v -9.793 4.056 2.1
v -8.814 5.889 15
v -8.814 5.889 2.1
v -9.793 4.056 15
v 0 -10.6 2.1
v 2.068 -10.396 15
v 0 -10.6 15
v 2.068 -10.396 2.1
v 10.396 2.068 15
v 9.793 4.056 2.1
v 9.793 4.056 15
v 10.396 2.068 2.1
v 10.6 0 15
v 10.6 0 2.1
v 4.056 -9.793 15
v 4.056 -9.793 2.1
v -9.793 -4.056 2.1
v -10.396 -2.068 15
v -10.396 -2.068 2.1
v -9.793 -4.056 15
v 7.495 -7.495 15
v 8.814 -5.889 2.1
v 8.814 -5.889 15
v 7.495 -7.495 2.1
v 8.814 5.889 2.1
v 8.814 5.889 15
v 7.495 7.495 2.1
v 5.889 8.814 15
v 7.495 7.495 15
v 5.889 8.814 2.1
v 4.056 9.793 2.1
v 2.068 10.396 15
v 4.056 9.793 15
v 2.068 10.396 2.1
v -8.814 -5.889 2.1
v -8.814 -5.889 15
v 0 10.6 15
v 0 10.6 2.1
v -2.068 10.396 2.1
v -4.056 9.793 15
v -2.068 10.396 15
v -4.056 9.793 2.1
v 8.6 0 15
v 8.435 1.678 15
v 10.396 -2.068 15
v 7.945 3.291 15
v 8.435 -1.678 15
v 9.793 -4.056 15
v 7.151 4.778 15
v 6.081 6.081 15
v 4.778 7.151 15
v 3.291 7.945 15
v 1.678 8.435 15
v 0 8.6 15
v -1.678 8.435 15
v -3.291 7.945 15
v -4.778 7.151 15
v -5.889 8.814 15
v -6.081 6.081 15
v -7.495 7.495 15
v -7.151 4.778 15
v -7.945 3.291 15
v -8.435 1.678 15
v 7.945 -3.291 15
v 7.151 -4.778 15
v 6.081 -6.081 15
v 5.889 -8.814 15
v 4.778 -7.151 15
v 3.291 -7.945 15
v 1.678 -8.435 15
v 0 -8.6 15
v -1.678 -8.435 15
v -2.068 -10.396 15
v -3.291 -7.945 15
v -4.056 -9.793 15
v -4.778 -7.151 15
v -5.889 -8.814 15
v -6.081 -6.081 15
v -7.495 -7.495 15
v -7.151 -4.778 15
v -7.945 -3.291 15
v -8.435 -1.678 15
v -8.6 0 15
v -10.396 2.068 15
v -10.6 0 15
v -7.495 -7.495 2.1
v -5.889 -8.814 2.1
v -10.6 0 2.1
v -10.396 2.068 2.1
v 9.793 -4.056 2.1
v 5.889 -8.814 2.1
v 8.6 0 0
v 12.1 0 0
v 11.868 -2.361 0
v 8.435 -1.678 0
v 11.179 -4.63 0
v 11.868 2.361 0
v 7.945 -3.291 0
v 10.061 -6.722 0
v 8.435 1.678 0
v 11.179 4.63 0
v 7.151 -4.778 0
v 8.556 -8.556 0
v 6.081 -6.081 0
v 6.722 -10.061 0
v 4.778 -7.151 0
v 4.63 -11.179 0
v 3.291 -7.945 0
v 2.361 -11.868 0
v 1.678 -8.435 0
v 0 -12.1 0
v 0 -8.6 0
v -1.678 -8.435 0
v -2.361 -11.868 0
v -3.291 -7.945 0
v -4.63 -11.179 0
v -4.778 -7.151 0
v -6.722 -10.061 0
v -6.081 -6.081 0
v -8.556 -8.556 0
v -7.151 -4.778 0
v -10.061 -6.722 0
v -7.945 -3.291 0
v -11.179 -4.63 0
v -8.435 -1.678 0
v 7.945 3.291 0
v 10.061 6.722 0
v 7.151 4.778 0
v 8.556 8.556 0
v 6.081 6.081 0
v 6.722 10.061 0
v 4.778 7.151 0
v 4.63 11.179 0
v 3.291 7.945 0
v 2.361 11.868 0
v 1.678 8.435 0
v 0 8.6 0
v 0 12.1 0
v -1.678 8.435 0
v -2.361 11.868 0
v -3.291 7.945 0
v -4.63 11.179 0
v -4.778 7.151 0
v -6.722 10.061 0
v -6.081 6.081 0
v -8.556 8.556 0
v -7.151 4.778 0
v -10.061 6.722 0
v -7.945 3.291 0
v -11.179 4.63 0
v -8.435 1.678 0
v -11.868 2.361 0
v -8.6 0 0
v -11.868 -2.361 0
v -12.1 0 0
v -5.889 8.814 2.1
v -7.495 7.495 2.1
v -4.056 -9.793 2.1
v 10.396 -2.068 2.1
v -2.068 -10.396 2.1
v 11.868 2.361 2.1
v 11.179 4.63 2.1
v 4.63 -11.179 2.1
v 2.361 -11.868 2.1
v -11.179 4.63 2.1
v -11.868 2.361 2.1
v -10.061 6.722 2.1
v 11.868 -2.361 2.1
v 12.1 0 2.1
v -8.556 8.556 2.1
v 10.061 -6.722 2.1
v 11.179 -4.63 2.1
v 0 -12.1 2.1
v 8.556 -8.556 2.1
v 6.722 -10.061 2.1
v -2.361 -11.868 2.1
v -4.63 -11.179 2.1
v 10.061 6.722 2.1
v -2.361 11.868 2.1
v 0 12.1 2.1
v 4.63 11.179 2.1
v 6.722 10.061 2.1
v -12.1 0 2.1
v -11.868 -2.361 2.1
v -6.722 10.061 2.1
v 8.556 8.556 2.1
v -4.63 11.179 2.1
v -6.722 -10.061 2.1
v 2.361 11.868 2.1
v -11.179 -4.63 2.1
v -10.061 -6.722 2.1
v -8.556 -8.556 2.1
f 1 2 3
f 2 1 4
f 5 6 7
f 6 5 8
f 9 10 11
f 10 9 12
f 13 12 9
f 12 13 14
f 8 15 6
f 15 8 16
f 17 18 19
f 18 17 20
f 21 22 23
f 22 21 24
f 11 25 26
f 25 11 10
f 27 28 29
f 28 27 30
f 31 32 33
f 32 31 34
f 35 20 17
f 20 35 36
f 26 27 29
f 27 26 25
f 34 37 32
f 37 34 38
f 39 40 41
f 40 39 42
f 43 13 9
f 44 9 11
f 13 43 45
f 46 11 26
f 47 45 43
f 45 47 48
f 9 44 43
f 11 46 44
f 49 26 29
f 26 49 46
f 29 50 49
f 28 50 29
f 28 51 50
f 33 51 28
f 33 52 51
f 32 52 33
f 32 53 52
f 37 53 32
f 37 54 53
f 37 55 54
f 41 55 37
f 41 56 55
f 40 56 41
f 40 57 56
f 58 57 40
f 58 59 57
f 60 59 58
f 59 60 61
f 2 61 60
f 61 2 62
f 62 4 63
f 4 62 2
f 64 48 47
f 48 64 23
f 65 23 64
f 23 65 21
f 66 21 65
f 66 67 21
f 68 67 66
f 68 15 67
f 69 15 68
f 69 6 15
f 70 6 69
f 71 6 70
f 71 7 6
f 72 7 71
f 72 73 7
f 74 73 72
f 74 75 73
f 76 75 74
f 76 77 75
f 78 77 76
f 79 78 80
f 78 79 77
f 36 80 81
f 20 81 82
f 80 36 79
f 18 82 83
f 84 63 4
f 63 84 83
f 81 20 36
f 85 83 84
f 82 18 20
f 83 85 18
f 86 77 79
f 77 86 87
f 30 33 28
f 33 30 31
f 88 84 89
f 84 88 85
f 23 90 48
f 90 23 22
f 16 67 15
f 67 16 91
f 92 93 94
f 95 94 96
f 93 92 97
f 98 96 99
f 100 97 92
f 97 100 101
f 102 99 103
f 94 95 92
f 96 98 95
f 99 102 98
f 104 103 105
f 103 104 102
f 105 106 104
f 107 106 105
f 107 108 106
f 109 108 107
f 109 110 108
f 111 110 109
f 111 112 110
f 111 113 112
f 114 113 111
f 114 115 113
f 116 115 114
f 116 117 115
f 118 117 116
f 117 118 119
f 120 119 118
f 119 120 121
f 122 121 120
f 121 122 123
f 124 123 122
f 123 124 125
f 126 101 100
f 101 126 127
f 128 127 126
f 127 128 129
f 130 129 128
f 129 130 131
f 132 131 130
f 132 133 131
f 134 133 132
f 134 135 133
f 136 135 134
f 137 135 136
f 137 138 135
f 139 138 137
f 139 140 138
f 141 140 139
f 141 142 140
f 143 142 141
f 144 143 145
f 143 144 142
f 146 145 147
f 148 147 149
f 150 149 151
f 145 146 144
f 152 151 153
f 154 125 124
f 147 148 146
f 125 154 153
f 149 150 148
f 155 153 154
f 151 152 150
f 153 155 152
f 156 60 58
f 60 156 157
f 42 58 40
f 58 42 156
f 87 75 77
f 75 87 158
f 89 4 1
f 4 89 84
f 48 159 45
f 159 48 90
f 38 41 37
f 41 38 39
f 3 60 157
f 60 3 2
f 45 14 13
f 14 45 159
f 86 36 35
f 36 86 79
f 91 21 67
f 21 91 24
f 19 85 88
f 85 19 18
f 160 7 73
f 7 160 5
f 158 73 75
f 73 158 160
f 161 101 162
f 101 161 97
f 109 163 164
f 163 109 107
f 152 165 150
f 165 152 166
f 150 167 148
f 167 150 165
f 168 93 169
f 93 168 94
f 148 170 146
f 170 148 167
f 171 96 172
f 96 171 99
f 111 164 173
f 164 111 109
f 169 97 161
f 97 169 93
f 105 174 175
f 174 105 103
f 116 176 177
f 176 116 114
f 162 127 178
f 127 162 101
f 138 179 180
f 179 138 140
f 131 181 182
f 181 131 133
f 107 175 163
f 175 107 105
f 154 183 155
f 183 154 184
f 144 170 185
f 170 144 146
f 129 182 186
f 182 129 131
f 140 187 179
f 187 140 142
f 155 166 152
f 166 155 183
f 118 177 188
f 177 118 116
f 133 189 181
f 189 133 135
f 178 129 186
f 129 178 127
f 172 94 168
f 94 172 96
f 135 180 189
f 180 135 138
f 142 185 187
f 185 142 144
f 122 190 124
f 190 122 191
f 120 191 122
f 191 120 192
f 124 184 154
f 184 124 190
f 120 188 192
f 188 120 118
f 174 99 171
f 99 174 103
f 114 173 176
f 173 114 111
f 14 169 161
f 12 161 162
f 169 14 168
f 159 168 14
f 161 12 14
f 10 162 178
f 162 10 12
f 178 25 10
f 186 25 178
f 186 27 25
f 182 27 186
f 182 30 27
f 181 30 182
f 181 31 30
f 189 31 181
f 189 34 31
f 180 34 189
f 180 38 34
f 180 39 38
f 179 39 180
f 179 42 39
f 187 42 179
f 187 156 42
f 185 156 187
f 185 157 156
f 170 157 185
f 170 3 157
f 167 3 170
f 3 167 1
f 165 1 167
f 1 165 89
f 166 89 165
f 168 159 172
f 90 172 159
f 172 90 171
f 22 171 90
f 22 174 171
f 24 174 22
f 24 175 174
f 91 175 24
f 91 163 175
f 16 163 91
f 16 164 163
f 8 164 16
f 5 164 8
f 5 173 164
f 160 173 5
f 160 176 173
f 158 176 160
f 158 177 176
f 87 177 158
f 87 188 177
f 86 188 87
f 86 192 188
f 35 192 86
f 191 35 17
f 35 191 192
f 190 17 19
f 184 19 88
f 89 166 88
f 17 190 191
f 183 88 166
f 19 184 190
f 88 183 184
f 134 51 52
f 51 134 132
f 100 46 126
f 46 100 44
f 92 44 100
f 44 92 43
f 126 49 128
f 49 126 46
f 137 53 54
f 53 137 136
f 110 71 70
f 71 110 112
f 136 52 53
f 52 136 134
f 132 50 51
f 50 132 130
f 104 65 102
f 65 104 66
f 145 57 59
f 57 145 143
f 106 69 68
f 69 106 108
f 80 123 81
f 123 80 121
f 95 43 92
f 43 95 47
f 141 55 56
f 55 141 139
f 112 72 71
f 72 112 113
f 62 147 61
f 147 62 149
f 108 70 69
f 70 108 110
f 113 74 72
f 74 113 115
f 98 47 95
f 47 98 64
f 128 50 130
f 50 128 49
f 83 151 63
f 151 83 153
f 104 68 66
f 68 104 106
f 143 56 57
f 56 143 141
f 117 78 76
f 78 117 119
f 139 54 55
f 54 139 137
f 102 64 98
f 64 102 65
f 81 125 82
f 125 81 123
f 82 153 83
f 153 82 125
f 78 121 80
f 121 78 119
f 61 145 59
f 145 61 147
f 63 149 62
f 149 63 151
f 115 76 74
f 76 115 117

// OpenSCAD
$fn = 32;

// ----------------------------------------------------------------------
// Spacer sleeve: 21.2 / 17.2 x 15 mm
// ----------------------------------------------------------------------

// --- parameters (mm) ---
sleeve_od = 21.2;         // outside diameter
sleeve_id = 17.2;         // shaft bore
sleeve_l = 15;            // sleeve length
flange_d = 24.2;          // collar diameter
flange_t = 1.5;           // collar thickness

module sleeve() {
  cylinder(h = sleeve_l, d = sleeve_od);
  cylinder(h = flange_t + 0.6, d = flange_d);
}

difference() {
  sleeve();
  translate([0, 0, -1]) cylinder(h = sleeve_l + 2, d = sleeve_id);
}
